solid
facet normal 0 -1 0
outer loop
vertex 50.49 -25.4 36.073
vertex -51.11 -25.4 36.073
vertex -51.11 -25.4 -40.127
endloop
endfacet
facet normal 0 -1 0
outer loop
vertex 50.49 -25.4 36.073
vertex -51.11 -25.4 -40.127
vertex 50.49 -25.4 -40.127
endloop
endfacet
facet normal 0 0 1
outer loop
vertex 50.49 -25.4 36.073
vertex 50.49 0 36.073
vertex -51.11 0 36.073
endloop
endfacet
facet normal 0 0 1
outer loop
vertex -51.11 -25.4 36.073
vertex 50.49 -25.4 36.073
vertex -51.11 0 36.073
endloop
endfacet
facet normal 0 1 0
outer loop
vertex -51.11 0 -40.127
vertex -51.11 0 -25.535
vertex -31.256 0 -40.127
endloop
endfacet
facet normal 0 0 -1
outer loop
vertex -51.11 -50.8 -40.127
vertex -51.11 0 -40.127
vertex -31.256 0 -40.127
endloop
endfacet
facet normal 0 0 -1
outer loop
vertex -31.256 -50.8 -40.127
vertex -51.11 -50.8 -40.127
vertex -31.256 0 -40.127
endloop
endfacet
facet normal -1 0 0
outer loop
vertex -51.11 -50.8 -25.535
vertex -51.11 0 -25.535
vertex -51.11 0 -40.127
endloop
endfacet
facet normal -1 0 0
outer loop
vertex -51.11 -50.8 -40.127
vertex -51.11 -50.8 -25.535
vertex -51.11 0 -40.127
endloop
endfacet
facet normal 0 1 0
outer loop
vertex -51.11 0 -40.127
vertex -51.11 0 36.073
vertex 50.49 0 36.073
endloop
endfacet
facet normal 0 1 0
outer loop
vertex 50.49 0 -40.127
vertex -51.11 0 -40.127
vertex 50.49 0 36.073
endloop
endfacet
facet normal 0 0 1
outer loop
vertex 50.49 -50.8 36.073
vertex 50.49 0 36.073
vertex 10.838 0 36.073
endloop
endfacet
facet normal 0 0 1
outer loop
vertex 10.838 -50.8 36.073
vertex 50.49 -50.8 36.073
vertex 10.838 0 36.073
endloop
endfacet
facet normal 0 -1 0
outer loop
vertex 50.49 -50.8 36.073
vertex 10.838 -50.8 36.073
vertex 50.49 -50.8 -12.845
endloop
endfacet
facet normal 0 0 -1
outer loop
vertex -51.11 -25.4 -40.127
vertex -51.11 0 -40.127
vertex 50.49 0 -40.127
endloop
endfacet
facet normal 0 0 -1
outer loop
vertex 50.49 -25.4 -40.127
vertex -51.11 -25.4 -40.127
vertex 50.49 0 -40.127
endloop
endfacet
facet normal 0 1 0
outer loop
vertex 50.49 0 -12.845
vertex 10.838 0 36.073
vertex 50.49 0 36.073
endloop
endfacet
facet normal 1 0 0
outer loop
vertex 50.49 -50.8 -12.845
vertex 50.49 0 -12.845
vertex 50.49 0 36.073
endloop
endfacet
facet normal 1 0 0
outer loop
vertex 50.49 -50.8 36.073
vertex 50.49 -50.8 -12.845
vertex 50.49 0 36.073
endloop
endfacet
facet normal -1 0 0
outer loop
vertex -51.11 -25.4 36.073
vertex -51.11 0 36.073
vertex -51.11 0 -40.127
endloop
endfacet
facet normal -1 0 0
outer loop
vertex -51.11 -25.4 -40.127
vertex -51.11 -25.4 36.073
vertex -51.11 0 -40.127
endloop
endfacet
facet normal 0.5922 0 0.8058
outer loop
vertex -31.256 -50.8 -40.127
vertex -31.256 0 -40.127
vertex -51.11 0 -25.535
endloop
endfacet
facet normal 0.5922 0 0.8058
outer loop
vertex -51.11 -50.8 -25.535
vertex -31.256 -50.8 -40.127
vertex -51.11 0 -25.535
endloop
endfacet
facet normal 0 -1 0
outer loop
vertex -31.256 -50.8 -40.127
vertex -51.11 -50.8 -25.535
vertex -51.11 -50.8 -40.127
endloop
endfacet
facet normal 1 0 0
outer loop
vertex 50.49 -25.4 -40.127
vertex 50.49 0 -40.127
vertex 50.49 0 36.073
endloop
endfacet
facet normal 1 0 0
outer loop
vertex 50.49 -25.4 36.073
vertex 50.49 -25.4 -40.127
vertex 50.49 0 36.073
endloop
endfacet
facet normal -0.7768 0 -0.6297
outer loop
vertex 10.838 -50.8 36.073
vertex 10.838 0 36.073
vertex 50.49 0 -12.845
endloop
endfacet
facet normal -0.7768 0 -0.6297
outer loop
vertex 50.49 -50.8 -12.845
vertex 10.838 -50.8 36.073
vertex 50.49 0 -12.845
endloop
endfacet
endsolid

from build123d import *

# Parameters (mm, degrees)
F1_DEPTH = 50.8
F2_DEPTH = 25.4


with BuildPart() as f1:
    # F0 (on Front) → F1 (new body)
    with BuildSketch(Plane.XZ):
        Polygon((50.490484, 36.073038), (10.837989, 36.073038), (50.490484, -12.844932), align=None)
        Polygon((-31.256251, -40.126962), (-51.109516, -25.535107), (-51.109516, -40.126962), align=None)
    extrude(amount=F1_DEPTH)


with BuildPart() as f2:
    # F0 (on Front) → F2 (new body)
    with BuildSketch(Plane.XZ):
        Polygon((10.837989, 36.073038), (-51.109516, 36.073038), (-51.109516, -25.535107), (-31.256251, -40.126962), (50.490484, -40.126962), (50.490484, -12.844932), align=None)
        Polygon((50.490484, 36.073038), (10.837989, 36.073038), (50.490484, -12.844932), align=None)
        Polygon((-31.256251, -40.126962), (-51.109516, -25.535107), (-51.109516, -40.126962), align=None)
    extrude(amount=F2_DEPTH)


solid = Compound([f1.part, f2.part])
